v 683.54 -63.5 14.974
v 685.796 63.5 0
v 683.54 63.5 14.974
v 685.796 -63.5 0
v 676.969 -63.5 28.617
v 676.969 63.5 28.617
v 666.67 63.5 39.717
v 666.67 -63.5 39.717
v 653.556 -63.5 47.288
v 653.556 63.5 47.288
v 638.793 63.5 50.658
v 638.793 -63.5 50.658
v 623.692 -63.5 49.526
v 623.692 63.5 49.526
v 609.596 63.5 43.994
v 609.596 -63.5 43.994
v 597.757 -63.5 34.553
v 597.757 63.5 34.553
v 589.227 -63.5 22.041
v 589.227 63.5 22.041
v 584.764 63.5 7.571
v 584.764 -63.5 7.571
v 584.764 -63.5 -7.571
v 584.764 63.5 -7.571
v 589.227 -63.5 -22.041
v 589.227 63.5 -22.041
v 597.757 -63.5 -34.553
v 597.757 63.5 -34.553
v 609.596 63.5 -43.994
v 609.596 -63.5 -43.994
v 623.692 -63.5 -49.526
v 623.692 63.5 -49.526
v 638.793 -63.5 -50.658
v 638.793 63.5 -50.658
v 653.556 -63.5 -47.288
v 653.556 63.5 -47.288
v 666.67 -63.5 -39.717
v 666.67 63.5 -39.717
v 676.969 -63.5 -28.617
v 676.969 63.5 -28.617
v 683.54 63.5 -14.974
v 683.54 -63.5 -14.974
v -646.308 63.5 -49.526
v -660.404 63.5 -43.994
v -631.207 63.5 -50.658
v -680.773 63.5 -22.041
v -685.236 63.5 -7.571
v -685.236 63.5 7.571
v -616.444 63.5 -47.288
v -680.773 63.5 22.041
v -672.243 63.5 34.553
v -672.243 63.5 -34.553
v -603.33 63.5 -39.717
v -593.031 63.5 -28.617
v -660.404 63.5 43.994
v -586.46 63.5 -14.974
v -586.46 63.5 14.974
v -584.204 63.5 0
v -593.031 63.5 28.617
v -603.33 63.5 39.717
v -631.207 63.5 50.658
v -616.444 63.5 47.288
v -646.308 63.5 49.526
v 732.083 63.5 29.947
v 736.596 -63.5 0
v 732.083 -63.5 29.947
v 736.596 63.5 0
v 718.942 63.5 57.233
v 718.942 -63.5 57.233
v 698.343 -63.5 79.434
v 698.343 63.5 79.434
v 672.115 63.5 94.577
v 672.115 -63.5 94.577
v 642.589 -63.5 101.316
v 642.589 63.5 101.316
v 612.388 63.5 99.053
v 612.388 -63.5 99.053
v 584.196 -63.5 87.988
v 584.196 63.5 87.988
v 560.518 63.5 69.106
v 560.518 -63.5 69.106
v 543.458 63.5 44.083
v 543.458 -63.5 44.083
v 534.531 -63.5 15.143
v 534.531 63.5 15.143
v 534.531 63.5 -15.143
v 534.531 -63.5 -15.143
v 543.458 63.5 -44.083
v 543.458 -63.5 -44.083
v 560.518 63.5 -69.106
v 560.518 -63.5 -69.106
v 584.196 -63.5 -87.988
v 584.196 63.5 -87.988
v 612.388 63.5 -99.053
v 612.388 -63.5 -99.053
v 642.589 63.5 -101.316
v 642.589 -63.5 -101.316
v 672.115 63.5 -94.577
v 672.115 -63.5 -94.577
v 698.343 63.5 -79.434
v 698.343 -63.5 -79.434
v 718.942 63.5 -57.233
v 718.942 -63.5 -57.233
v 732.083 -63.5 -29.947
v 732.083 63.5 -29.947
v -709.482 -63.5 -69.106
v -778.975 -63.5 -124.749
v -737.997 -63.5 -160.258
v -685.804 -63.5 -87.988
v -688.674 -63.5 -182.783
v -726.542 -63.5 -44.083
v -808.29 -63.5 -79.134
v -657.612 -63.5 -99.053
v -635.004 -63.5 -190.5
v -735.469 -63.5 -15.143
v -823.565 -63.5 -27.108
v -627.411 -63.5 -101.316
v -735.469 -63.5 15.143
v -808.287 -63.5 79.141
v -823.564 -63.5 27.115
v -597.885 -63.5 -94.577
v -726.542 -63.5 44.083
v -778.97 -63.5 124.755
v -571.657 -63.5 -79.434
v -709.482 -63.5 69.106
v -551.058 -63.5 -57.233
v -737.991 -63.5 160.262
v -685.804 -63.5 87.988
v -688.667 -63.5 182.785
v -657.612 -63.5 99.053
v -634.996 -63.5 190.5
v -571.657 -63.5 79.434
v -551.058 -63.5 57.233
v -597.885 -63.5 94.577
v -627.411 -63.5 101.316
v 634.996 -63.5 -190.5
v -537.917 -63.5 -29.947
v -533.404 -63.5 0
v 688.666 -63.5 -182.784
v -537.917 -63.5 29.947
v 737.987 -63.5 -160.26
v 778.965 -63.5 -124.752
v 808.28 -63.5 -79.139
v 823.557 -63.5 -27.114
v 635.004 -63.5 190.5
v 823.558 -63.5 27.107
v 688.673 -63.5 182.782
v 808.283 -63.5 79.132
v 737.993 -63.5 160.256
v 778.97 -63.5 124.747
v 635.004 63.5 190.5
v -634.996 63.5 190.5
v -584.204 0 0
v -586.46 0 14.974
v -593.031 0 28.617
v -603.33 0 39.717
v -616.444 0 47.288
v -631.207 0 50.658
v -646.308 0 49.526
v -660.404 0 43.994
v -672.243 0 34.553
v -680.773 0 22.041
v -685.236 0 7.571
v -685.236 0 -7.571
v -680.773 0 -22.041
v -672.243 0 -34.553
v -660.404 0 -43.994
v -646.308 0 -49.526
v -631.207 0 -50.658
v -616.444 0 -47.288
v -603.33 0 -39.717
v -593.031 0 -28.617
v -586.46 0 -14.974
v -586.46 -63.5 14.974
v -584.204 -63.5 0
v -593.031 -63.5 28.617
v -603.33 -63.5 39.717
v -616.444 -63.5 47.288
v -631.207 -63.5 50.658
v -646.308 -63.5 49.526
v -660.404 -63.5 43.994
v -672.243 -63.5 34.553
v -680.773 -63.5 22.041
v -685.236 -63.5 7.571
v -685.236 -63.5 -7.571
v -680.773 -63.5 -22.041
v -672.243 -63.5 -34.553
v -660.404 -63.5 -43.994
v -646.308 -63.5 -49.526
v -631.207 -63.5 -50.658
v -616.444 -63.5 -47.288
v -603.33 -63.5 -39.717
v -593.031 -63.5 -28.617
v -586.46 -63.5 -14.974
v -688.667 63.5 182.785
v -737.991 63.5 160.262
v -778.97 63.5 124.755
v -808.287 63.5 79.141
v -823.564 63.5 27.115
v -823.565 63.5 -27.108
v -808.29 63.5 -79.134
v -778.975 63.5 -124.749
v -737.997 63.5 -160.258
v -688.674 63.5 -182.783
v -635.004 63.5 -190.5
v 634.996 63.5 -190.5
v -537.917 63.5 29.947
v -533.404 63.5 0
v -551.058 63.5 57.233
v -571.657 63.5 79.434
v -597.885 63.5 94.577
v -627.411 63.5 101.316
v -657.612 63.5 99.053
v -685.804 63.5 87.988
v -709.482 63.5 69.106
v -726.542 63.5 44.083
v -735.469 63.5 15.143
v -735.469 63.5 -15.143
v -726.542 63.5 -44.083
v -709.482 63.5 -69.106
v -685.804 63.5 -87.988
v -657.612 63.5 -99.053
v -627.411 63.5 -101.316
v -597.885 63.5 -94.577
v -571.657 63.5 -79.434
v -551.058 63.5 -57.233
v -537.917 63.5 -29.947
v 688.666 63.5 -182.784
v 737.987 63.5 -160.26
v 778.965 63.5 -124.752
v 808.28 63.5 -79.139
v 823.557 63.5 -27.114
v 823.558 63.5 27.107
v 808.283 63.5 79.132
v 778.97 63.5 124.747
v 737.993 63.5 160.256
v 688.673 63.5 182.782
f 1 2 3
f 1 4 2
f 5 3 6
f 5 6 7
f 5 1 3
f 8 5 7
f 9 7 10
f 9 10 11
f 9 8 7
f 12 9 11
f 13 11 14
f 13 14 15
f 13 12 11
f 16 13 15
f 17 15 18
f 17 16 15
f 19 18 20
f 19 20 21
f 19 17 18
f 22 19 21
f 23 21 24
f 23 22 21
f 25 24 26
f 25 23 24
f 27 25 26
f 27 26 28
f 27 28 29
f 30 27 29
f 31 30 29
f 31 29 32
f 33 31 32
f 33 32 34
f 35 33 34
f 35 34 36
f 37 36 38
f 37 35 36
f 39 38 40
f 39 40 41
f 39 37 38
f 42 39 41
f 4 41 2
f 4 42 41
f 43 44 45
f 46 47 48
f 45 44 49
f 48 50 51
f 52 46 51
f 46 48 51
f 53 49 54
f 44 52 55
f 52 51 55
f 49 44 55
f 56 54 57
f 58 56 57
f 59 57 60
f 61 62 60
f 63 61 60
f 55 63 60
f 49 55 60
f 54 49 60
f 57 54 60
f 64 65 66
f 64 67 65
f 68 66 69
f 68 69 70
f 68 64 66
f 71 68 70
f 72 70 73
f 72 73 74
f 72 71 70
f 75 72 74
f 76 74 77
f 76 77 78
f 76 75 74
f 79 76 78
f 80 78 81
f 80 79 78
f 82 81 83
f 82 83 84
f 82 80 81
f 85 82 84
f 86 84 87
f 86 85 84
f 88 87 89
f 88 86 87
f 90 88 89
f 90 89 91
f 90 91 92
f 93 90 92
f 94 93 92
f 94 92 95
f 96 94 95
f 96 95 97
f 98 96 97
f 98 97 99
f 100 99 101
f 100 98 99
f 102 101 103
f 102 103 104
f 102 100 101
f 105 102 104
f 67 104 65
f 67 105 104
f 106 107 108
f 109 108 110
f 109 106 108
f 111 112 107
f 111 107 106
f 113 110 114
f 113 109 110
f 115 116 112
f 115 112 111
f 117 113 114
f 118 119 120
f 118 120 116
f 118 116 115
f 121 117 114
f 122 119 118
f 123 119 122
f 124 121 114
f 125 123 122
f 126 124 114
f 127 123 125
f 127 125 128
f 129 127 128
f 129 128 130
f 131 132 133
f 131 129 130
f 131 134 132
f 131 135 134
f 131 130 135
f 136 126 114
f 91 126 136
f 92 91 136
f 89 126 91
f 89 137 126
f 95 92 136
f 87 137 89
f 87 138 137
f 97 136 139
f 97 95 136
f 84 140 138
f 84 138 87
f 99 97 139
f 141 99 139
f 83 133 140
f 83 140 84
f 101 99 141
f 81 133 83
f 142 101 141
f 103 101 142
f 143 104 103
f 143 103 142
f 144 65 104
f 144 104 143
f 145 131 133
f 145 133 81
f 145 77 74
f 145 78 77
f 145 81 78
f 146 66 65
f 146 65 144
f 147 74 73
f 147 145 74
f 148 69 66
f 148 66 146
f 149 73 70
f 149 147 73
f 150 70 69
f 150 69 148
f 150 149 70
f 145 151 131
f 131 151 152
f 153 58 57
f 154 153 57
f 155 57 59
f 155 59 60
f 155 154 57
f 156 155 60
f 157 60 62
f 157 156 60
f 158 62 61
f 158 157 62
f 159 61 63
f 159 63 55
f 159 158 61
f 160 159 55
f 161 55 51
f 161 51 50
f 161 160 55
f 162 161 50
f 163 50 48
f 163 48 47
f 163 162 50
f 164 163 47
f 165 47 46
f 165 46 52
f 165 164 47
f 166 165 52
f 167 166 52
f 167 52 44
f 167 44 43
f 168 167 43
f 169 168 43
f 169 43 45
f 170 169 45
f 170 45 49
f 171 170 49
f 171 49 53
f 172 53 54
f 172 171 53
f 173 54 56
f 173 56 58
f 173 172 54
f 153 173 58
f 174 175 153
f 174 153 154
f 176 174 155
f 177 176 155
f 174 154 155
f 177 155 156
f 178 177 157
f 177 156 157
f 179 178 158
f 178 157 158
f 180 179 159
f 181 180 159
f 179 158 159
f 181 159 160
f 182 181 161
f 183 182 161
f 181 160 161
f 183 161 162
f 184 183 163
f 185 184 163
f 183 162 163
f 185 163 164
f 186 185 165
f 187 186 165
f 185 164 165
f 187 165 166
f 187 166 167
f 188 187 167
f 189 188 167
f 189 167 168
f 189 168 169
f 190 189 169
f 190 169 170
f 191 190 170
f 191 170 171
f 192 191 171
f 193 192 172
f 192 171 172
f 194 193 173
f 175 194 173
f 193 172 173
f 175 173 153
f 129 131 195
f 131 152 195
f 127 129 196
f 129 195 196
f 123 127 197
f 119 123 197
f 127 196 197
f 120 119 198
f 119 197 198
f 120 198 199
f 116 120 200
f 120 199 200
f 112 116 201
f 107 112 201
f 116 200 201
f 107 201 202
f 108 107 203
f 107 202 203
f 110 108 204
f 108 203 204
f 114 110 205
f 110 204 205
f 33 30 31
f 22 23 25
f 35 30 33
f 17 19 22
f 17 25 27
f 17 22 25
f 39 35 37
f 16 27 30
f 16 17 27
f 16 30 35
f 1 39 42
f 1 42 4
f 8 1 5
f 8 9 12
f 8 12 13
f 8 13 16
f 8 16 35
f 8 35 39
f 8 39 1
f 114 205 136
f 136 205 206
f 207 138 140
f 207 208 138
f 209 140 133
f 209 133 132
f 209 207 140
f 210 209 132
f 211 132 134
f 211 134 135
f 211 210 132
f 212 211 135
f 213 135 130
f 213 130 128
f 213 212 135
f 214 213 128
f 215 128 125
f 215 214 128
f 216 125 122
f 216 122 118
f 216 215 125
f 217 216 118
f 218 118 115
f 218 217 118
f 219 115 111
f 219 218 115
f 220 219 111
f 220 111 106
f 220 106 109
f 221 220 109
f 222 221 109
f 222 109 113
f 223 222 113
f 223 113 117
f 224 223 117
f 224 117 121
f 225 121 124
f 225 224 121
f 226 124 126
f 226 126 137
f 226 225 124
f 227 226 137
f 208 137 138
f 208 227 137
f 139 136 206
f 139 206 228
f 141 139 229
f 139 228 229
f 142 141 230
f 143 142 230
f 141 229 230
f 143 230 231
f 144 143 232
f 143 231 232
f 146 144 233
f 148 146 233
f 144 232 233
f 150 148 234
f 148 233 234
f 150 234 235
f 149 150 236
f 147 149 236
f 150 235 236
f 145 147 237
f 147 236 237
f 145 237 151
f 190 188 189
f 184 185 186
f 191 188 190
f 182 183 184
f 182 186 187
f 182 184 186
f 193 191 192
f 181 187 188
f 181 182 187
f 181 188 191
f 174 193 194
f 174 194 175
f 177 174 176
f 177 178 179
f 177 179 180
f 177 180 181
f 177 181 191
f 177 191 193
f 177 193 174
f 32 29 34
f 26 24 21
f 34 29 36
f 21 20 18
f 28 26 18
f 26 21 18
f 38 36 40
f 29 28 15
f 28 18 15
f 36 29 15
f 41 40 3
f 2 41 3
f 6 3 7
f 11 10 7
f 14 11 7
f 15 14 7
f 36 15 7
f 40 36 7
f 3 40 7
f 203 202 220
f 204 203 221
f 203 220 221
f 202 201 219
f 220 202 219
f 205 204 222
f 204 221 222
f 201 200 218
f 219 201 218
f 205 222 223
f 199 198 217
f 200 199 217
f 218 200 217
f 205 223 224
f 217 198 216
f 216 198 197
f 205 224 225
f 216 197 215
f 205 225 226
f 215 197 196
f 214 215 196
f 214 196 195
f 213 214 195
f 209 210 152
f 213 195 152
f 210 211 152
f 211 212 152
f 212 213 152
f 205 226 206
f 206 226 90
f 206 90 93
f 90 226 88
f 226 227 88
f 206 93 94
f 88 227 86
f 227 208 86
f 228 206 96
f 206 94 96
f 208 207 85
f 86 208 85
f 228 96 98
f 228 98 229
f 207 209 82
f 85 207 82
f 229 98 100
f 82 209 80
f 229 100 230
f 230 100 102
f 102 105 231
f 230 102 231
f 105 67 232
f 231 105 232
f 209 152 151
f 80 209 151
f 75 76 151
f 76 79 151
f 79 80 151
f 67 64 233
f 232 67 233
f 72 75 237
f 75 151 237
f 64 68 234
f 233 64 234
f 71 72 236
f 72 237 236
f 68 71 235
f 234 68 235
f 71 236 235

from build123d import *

# Parameters (mm, degrees)
F0_R     = 101.6
F0_R_2   = 50.8
F1_DEPTH = 63.5


with BuildPart() as f1:
    # F0 (on Front) → F1 (new body, symmetric)
    with BuildSketch(Plane.XZ):
        with BuildLine():
            ThreePointArc((634.996429, -190.5), (825.496429, -0.003571), (635.003571, 190.5))
            Line((635.003571, 190.5), (-634.996429, 190.5))
            ThreePointArc((-634.996429, 190.5), (-825.503571, 0.003571), (-635.003571, -190.5))
            Line((-635.003571, -190.5), (634.996429, -190.5))
        make_face()
        with Locations((634.996429, 0)):
            Circle(F0_R, mode=Mode.SUBTRACT)
        with Locations((-635.003571, 0)):
            Circle(F0_R, mode=Mode.SUBTRACT)
        with Locations((-635.003571, 0)):
            Circle(F0_R_2)
        with Locations((634.996429, 0)):
            Circle(F0_R_2)
    extrude(amount=F1_DEPTH, both=True)


solid = f1.part
